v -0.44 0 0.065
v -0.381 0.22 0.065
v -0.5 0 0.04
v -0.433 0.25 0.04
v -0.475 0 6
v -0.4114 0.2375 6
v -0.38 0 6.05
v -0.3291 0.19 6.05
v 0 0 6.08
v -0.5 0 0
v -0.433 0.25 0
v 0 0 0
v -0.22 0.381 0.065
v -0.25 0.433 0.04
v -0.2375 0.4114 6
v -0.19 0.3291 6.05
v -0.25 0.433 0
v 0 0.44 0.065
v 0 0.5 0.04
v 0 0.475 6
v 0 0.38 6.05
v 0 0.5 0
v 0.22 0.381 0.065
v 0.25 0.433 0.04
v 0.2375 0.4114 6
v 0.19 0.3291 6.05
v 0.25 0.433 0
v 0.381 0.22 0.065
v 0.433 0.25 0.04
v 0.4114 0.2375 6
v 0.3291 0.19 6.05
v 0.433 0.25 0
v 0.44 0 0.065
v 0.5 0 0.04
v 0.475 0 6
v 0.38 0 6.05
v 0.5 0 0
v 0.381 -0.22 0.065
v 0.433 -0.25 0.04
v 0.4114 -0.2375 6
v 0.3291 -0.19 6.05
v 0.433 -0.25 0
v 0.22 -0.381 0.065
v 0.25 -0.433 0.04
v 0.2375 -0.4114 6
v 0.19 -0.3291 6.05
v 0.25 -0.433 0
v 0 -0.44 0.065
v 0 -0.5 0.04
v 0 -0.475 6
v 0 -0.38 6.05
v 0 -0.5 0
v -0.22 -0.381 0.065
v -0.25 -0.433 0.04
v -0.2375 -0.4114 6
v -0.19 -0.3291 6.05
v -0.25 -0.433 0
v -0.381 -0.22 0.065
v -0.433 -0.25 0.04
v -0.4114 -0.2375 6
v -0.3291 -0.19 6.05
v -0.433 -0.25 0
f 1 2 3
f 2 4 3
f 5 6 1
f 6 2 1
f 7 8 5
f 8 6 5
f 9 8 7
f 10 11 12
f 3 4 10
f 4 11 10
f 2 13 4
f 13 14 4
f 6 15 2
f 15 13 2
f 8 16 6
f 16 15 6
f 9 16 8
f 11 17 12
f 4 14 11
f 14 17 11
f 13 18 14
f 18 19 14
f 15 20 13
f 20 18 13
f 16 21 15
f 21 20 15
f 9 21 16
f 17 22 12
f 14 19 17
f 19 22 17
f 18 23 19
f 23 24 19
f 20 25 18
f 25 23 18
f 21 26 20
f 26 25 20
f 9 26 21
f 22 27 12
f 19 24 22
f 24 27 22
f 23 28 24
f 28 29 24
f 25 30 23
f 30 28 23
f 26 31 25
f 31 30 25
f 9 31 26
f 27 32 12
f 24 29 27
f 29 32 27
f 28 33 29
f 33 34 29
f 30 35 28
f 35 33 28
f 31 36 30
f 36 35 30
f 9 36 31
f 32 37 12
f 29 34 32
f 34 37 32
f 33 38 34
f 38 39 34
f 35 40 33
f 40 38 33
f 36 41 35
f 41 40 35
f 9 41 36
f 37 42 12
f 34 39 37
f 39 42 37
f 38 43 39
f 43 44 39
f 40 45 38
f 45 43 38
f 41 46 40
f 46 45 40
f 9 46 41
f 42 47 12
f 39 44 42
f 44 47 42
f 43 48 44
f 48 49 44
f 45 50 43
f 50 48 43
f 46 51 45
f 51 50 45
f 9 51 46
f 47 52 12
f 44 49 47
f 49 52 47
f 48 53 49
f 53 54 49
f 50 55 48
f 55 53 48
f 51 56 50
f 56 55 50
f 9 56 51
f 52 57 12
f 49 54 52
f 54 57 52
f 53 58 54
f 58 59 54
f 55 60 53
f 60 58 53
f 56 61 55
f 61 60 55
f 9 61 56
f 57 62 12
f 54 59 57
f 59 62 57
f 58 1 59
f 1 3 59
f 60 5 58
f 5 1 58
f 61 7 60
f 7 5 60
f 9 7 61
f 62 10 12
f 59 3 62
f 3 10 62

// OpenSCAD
// Carousel Autoloader 0.2.24 - separate propellant charge of two-piece ammunition: a case without
// projectile (rim, extraction groove, body) closed by a combustible plug. Unit calibre (d = 1),
// rim at z = 0, plug at z = C0 + 0.08 (toward the gun). Zones (mirrored in AutoloaderModelGeometry):
//   A [0, 0.065]        rim (hulsrand) and groove (groef)  fixed
//   B [0.065, C0]       case body                          stretched to the true charge length
//   C [C0, C0+0.08]     plug                               fixed
C0 = 6;
fn = 12;   // 12 (fine) or 8 (medium/coarse)
rotate_extrude($fn = fn)
  polygon([[0,0],[0.5,0],[0.5,0.04],[0.44,0.065],[0.475,C0],[0.38,C0+0.05],[0,C0+0.08]]);
